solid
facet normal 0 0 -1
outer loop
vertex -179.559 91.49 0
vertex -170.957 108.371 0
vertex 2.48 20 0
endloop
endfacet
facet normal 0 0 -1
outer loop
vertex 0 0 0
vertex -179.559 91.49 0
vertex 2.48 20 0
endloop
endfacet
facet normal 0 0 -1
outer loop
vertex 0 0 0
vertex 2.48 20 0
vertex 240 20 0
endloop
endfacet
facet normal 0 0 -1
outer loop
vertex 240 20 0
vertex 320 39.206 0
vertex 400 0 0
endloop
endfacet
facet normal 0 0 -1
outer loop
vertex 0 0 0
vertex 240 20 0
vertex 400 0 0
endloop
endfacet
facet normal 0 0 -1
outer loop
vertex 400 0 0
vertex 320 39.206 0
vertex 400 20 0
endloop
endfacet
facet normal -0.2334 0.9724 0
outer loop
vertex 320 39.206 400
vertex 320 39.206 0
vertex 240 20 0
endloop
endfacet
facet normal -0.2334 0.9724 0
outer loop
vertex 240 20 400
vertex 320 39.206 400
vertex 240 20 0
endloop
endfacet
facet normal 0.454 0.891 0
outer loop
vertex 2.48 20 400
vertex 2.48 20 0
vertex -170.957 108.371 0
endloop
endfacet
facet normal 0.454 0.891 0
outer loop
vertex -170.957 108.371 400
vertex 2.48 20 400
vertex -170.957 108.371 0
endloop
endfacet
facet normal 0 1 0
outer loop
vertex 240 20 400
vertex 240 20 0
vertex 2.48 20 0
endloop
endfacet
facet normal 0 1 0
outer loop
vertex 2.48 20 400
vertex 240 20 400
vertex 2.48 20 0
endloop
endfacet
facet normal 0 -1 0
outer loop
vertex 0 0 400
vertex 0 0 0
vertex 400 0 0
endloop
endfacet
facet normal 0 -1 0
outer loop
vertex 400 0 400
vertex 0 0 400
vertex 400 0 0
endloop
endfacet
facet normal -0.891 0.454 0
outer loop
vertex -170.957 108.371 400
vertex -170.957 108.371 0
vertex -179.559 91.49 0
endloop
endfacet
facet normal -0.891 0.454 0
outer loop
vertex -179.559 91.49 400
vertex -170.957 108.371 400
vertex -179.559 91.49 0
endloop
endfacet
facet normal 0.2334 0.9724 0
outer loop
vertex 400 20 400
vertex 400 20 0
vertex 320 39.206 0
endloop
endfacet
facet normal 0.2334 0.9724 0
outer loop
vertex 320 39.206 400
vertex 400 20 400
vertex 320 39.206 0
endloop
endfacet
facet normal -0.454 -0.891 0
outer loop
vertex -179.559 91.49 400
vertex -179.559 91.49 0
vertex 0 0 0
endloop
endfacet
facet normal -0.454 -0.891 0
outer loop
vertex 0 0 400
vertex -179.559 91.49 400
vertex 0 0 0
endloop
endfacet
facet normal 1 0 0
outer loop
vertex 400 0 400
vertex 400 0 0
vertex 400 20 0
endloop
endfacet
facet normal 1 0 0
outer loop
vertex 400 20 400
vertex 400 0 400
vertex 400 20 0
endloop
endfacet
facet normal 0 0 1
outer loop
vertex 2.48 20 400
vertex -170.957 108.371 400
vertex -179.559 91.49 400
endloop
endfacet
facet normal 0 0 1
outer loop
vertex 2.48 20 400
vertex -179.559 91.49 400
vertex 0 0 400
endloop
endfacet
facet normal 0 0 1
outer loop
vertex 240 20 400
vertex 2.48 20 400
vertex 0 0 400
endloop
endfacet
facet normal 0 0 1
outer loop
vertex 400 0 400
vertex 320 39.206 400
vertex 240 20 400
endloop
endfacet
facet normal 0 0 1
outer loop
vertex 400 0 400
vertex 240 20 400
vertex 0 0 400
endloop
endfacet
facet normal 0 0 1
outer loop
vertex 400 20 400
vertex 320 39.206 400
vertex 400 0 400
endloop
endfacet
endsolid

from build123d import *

# Parameters (mm, degrees)
RESSALTO_EXTRUS_O1_DEPTH = 400


with BuildPart() as part:
    # Esboço1 → Ressalto-extrusão1 (new body)
    with BuildSketch(Plane.XY):
        Polygon((8.601413754, 16.881224995), (0, 0), (400, 0), (400, 20), (240, 20), (2.480473166, 20), align=None)
        Polygon((-179.558563965, 91.489658015), (0, 0), (0, 20), (2.480473166, 20), (-170.957150212, 108.37088301), align=None)
        Polygon((0, 20), (0, 0), (8.601413754, 16.881224995), (2.480473166, 20), align=None)
        Polygon((240, 20), (400, 20), (320, 39.206300726), align=None)
    extrude(amount=RESSALTO_EXTRUS_O1_DEPTH)


solid = part.part
